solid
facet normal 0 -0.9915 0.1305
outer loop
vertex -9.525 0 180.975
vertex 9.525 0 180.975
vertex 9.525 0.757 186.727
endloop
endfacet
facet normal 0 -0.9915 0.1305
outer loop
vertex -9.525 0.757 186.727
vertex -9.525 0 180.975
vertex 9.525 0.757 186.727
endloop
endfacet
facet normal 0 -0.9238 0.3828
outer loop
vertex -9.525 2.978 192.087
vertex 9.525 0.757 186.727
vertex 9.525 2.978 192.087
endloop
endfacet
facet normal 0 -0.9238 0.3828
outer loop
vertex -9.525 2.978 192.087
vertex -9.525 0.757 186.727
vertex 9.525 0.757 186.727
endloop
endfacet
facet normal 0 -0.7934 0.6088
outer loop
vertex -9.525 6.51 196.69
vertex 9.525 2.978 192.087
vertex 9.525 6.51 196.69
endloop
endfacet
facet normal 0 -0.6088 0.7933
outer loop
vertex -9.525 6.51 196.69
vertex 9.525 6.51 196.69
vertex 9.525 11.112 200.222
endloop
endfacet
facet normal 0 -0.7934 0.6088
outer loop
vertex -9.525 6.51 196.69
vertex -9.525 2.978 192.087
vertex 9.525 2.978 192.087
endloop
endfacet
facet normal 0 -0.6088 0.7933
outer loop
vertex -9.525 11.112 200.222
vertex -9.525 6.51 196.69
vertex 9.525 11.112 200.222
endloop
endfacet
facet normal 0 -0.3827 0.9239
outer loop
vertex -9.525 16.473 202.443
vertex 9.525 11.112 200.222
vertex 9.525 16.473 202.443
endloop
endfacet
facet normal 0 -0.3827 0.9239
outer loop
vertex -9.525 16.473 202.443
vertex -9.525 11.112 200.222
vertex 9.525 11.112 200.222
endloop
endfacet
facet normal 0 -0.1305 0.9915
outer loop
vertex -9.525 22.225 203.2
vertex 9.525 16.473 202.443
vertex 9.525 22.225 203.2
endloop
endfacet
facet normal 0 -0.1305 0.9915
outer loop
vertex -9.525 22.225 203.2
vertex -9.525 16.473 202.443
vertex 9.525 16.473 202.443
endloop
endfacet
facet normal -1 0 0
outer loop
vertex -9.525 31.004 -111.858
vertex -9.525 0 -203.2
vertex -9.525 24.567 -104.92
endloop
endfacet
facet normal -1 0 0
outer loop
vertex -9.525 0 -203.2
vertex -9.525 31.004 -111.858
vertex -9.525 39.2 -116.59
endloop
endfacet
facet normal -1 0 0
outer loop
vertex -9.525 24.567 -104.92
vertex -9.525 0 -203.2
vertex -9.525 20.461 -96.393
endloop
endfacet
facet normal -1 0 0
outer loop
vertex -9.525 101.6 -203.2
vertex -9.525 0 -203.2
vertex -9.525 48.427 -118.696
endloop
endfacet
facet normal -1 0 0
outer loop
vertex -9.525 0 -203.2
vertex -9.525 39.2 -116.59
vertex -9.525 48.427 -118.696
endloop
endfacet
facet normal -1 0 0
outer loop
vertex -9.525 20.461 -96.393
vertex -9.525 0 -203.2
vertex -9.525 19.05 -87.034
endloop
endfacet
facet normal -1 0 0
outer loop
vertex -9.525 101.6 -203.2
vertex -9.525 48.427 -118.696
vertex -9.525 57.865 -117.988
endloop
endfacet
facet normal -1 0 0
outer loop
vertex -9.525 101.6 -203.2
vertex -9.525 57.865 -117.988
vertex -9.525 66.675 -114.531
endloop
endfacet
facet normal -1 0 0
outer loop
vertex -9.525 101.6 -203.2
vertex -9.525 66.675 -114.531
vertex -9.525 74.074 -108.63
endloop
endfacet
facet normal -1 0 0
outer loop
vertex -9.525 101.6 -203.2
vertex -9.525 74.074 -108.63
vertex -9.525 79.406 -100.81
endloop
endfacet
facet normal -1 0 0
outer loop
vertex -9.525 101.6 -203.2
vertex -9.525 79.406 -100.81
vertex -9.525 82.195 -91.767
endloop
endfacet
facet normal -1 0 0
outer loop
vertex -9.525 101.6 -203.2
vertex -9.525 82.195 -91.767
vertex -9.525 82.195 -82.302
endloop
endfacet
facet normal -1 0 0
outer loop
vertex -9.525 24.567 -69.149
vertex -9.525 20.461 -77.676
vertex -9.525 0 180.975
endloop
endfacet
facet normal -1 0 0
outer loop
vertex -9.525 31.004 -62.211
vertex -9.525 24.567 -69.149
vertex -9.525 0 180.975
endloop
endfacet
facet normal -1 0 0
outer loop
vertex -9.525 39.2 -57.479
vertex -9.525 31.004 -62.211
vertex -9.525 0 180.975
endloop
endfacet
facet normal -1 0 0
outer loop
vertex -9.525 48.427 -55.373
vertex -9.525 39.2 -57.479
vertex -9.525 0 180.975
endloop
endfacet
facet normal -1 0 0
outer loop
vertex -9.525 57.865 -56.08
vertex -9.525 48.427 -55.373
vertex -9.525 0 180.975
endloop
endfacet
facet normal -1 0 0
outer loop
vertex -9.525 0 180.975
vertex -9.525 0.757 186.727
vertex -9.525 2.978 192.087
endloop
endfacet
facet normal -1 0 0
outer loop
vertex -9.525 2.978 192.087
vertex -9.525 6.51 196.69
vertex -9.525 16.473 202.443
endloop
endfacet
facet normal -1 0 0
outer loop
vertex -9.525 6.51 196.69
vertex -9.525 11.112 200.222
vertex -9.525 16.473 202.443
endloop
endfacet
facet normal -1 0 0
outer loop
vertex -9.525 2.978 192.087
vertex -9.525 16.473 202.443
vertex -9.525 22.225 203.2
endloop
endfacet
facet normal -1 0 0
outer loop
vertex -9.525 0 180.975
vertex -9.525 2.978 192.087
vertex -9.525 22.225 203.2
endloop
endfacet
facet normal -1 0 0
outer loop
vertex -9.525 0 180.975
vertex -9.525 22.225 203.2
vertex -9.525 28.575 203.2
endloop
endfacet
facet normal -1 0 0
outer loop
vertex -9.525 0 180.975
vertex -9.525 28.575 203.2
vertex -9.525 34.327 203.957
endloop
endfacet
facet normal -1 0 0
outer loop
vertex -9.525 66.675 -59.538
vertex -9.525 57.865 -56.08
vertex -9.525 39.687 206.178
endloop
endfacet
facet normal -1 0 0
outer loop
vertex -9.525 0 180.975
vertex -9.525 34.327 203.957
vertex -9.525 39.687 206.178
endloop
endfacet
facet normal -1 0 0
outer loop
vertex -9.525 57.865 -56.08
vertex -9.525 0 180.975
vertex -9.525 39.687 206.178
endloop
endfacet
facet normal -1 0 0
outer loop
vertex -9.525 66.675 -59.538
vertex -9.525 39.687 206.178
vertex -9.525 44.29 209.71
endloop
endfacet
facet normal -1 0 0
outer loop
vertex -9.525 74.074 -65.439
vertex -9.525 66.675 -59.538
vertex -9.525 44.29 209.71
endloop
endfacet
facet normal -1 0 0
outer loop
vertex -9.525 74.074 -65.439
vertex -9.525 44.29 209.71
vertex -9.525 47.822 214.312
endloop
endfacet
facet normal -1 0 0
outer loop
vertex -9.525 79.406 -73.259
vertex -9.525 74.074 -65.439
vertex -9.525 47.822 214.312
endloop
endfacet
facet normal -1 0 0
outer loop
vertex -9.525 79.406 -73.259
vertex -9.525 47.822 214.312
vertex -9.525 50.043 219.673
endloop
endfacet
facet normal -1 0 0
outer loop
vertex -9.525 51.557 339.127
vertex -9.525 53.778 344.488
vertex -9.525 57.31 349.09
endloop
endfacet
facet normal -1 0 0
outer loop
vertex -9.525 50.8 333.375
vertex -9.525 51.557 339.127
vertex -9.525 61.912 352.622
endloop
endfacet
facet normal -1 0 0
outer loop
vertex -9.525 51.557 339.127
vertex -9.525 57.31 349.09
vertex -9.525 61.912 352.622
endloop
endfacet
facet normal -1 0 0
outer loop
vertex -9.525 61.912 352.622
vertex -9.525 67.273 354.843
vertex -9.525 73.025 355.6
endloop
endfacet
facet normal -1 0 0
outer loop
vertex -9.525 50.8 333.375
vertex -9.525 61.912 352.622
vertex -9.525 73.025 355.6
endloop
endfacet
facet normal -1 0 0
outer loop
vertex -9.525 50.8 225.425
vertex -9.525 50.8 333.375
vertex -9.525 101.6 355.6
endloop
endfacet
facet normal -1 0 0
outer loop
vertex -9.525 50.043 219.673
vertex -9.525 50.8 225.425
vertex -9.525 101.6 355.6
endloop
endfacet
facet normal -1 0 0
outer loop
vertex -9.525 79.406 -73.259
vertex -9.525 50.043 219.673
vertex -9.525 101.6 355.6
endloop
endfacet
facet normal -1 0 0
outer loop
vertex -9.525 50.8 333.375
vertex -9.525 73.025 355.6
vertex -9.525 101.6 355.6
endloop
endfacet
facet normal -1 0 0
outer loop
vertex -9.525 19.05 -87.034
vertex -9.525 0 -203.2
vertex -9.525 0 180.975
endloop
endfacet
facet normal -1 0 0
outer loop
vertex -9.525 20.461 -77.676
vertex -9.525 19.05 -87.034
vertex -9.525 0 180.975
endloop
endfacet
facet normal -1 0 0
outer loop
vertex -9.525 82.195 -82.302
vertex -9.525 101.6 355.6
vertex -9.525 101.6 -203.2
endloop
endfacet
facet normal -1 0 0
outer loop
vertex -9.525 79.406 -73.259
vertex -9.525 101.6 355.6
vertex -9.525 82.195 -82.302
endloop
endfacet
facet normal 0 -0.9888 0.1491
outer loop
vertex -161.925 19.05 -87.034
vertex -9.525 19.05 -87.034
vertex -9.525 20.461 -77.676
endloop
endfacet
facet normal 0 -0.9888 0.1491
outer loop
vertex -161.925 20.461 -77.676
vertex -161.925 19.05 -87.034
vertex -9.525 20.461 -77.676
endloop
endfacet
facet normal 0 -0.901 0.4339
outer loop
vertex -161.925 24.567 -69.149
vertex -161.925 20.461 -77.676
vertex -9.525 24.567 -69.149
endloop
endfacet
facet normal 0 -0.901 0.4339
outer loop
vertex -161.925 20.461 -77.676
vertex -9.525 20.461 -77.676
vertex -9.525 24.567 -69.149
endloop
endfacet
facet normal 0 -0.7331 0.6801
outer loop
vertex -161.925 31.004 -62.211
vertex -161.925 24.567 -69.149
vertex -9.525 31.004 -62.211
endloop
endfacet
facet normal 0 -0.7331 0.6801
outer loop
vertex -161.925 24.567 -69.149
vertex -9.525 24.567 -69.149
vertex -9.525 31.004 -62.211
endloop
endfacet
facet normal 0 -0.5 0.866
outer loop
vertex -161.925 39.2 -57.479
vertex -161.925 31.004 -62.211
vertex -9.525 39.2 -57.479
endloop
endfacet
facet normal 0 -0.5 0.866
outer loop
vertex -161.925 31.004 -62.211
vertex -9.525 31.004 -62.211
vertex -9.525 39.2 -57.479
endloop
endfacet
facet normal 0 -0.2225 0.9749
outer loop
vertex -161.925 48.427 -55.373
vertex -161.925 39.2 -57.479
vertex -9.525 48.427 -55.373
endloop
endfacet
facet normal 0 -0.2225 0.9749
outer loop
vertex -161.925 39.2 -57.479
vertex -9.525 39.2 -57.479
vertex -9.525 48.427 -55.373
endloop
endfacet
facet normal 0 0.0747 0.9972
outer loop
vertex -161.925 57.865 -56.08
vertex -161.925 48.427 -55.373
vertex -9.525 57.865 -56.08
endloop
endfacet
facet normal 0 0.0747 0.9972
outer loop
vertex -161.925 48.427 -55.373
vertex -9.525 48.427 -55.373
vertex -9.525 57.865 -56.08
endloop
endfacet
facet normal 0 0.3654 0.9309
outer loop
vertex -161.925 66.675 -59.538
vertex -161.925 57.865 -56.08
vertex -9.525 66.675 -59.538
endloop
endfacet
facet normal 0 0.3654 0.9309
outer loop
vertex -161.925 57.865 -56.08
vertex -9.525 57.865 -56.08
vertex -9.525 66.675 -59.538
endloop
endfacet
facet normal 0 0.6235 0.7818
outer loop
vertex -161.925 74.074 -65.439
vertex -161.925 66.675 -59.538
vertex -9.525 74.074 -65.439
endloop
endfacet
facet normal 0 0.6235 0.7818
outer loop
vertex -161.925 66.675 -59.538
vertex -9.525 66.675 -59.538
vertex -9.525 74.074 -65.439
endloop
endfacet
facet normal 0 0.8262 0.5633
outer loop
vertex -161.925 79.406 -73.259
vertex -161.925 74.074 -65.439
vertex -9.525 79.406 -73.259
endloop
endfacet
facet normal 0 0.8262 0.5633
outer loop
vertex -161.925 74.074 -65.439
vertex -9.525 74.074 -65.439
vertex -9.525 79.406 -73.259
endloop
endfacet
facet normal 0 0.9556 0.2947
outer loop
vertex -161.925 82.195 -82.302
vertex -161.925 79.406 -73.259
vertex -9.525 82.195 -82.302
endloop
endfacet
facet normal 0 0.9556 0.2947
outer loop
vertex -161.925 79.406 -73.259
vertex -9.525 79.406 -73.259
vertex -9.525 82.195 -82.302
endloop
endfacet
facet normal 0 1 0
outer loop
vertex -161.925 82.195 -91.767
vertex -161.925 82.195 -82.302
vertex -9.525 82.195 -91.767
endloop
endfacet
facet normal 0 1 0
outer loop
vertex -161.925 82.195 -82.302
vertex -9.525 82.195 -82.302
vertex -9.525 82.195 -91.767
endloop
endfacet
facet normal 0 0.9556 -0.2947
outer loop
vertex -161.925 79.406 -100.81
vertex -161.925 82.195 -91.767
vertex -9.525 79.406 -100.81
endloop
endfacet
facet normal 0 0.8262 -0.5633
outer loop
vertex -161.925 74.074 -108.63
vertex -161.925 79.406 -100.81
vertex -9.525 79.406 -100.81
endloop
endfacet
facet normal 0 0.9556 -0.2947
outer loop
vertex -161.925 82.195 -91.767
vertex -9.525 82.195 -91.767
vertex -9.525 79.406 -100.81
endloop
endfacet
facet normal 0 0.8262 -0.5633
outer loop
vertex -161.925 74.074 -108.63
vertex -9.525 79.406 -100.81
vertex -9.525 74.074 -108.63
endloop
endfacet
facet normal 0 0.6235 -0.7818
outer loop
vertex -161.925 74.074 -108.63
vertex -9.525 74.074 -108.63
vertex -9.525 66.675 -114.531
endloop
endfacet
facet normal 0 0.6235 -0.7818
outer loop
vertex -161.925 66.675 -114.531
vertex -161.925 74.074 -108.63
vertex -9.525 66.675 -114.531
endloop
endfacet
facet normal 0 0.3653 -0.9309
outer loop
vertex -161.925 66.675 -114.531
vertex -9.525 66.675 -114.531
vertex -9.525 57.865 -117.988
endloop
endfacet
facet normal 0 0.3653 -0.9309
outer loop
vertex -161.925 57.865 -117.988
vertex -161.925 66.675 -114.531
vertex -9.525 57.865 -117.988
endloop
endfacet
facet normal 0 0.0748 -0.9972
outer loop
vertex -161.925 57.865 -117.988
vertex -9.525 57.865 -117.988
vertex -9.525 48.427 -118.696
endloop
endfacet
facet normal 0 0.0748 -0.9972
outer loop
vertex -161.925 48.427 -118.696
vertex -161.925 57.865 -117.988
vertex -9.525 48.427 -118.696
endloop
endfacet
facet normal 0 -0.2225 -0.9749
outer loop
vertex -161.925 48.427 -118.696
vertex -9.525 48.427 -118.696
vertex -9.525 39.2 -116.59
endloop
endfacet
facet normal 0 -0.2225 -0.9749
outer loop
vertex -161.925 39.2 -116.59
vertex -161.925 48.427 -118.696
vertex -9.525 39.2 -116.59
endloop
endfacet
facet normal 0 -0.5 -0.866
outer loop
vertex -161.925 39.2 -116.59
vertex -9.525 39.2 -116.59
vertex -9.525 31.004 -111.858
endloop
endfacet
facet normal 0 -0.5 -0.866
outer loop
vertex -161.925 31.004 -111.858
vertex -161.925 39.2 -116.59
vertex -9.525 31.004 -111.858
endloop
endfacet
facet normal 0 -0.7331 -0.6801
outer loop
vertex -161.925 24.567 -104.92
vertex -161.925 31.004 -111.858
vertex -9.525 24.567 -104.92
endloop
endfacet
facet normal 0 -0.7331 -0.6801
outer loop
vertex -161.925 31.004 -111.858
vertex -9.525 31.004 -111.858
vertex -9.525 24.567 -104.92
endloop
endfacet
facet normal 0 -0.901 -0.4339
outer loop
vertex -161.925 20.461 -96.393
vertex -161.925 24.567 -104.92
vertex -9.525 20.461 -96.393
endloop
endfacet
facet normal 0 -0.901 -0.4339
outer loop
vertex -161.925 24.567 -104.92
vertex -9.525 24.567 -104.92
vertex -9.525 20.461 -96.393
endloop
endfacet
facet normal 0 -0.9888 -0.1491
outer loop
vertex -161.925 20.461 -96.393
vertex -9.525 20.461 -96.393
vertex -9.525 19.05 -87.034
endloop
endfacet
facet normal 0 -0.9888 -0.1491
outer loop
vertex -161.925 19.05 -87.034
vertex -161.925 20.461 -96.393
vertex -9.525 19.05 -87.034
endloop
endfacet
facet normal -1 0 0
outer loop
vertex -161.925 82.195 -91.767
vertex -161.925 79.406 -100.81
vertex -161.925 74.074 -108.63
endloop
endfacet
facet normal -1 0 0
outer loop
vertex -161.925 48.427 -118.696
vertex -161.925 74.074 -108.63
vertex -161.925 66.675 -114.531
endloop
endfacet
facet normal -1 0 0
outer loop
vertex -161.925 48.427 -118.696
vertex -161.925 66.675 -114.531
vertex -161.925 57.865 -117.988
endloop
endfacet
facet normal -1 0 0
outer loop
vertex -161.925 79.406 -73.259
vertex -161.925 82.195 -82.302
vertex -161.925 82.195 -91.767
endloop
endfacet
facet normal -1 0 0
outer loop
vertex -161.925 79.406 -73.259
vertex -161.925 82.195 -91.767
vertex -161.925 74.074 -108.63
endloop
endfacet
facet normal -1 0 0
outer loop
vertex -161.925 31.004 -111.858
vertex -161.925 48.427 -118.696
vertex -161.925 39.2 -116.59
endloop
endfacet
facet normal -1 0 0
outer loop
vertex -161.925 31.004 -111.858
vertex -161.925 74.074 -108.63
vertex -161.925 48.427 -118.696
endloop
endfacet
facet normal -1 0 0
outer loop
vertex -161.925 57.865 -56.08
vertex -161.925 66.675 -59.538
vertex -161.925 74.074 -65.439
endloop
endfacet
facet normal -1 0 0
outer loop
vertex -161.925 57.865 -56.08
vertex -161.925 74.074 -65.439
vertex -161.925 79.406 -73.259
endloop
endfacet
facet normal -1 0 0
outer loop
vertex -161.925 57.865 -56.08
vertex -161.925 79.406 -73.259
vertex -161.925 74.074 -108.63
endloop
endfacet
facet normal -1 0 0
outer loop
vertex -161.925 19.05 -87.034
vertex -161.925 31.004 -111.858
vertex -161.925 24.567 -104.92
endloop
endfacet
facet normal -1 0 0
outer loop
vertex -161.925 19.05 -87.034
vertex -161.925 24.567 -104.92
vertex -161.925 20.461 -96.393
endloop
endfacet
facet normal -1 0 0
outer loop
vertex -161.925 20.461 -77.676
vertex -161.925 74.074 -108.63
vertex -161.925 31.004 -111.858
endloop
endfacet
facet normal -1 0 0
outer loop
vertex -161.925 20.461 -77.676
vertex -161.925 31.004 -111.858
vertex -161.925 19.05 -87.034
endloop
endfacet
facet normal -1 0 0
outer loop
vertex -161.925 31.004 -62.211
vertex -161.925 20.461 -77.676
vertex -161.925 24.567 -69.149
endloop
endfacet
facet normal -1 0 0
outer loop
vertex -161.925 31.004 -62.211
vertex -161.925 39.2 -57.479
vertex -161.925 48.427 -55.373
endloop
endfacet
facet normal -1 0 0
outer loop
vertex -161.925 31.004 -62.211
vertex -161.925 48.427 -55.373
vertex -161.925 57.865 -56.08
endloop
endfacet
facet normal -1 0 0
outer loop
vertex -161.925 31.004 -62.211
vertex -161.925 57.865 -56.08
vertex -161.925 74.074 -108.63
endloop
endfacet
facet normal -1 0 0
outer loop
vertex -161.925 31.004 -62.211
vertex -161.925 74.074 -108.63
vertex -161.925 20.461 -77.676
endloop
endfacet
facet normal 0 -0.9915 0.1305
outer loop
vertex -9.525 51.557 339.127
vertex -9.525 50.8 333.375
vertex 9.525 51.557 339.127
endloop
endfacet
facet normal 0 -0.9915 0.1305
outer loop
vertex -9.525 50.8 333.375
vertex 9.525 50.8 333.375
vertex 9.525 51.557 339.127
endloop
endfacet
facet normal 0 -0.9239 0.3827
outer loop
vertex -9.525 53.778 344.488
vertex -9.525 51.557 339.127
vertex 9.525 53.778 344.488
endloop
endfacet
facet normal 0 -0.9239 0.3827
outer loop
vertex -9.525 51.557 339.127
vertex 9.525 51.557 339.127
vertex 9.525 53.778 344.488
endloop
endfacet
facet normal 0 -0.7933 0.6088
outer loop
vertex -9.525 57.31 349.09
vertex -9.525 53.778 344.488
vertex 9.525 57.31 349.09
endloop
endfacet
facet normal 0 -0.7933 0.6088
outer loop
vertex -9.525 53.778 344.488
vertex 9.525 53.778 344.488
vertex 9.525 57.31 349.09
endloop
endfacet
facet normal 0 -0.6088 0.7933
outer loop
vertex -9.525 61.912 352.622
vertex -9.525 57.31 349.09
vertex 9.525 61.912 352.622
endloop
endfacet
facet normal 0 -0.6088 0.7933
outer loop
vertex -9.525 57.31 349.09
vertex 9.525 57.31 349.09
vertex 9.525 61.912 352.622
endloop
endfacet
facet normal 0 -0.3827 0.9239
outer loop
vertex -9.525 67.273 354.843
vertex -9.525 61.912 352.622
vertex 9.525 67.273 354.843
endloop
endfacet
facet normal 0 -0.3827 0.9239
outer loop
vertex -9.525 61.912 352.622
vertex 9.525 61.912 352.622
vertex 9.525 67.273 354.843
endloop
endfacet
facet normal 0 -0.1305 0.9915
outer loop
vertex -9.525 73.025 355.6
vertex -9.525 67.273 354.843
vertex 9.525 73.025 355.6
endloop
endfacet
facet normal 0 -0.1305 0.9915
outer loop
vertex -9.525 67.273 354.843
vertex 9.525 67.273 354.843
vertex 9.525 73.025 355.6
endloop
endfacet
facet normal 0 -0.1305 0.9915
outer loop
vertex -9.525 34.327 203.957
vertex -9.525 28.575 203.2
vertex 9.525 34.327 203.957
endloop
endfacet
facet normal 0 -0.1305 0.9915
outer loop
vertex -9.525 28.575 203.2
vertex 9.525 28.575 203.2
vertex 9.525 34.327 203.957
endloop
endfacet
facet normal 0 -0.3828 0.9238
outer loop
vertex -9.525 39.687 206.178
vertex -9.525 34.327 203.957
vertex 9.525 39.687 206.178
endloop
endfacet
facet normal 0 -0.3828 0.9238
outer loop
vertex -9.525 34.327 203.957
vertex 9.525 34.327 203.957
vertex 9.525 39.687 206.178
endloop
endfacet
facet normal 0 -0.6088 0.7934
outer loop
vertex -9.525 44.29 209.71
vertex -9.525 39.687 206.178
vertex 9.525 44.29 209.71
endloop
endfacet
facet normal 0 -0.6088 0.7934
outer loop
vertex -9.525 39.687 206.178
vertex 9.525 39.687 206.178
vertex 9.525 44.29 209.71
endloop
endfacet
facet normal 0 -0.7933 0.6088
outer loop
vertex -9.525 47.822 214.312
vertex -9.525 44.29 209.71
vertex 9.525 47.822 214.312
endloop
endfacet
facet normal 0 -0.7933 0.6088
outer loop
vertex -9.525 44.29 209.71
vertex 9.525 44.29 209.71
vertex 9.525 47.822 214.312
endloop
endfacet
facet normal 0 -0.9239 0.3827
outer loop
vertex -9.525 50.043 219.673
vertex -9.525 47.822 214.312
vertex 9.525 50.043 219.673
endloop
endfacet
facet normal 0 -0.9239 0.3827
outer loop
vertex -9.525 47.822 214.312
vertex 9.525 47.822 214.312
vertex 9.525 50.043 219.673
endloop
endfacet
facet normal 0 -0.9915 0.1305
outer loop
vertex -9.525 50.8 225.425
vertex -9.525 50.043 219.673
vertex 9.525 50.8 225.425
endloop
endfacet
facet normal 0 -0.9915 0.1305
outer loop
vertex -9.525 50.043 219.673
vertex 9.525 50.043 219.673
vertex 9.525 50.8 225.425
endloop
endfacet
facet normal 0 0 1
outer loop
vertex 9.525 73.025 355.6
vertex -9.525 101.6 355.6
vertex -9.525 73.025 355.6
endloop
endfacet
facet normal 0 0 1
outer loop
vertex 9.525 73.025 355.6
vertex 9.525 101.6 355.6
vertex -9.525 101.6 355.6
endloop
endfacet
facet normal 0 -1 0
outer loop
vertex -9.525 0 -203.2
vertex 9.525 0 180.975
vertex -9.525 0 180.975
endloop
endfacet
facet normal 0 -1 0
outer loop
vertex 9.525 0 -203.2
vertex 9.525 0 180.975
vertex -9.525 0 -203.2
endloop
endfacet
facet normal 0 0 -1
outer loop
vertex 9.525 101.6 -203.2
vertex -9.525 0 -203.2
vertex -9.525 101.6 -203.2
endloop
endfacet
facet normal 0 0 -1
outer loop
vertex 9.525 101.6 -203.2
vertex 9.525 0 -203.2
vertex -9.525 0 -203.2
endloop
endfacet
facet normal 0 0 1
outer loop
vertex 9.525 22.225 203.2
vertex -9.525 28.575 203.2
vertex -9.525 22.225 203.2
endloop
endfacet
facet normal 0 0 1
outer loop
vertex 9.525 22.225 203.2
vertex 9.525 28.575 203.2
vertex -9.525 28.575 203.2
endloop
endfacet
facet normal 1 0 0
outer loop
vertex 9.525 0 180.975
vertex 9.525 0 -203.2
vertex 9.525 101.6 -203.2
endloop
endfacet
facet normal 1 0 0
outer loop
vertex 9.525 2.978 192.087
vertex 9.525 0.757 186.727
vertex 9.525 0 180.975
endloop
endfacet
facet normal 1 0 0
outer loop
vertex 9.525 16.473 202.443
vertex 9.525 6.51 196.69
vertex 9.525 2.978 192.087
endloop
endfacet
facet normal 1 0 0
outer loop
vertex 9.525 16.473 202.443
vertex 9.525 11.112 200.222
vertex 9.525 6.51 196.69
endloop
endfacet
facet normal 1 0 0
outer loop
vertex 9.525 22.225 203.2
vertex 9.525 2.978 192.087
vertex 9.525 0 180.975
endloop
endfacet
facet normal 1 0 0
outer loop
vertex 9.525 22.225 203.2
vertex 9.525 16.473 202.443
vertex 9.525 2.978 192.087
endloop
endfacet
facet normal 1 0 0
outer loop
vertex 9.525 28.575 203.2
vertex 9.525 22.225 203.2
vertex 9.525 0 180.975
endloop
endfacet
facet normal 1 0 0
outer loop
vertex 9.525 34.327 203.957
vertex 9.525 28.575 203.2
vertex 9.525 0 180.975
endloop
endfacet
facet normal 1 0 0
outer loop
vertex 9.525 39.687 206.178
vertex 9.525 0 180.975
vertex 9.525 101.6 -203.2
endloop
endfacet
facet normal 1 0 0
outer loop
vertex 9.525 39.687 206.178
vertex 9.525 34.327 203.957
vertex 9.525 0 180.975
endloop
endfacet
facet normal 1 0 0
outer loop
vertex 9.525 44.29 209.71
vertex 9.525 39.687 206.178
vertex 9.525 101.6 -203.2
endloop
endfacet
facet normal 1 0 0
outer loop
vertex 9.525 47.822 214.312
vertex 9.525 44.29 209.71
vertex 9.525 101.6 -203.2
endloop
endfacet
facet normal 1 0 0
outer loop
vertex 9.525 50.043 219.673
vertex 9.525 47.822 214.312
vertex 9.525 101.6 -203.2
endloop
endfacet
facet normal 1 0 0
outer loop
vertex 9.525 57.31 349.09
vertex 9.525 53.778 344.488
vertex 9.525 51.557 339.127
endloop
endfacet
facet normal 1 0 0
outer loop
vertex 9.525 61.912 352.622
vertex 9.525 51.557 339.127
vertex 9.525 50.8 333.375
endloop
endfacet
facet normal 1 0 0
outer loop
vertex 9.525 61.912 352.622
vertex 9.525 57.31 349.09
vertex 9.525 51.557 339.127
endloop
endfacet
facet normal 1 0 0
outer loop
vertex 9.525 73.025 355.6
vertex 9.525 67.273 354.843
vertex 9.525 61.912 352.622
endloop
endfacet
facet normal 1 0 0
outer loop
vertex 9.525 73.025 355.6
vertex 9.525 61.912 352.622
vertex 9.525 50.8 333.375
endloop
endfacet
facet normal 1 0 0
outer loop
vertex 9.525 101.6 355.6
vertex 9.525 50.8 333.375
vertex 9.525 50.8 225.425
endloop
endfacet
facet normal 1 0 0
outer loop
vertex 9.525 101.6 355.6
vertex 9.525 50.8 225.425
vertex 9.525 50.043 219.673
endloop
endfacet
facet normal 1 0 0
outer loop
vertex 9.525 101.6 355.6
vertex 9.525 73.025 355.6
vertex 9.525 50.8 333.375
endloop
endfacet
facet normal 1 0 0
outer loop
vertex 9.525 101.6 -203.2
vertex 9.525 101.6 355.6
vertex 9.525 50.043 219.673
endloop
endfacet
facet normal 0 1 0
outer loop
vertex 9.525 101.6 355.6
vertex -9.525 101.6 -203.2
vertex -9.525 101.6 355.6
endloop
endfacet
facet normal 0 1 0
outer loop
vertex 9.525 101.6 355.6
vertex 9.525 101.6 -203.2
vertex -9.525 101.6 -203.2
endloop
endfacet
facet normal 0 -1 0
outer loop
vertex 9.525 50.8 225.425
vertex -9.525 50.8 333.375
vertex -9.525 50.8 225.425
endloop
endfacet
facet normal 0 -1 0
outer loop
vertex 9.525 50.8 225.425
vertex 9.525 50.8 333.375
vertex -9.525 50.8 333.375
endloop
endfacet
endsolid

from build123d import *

# Parameters (mm, degrees)
F1_DEPTH = 9.525
F2_R     = 22.225
F3_R     = 31.75
F4_DEPTH = 152.4


with BuildPart() as f1:
    # F0 (on Right) → F1 (new body, symmetric)
    with BuildSketch(Plane.YZ):
        Polygon((101.6, -203.2), (101.6, 355.6), (50.8, 355.6), (50.8, 203.2), (0, 203.2), (0, -203.2), align=None)
    extrude(amount=F1_DEPTH, both=True)

    # F2
    f2_edges = [f1.edges().sort_by_distance(p)[0] for p in [
        (0, 50.8, 355.6),
        (0, 50.8, 203.2),
        (0, 0, 203.2),
    ]]
    fillet(f2_edges, radius=F2_R)

    # F3 (on face) → F4 (join)
    with BuildSketch(Plane(origin=(-9.525, 0, 0), x_dir=(0, -1, 0), z_dir=(-1, 0, 0))):
        with Locations((-50.8, -87.034412)):
            Circle(F3_R)
    extrude(amount=F4_DEPTH)


solid = f1.part
